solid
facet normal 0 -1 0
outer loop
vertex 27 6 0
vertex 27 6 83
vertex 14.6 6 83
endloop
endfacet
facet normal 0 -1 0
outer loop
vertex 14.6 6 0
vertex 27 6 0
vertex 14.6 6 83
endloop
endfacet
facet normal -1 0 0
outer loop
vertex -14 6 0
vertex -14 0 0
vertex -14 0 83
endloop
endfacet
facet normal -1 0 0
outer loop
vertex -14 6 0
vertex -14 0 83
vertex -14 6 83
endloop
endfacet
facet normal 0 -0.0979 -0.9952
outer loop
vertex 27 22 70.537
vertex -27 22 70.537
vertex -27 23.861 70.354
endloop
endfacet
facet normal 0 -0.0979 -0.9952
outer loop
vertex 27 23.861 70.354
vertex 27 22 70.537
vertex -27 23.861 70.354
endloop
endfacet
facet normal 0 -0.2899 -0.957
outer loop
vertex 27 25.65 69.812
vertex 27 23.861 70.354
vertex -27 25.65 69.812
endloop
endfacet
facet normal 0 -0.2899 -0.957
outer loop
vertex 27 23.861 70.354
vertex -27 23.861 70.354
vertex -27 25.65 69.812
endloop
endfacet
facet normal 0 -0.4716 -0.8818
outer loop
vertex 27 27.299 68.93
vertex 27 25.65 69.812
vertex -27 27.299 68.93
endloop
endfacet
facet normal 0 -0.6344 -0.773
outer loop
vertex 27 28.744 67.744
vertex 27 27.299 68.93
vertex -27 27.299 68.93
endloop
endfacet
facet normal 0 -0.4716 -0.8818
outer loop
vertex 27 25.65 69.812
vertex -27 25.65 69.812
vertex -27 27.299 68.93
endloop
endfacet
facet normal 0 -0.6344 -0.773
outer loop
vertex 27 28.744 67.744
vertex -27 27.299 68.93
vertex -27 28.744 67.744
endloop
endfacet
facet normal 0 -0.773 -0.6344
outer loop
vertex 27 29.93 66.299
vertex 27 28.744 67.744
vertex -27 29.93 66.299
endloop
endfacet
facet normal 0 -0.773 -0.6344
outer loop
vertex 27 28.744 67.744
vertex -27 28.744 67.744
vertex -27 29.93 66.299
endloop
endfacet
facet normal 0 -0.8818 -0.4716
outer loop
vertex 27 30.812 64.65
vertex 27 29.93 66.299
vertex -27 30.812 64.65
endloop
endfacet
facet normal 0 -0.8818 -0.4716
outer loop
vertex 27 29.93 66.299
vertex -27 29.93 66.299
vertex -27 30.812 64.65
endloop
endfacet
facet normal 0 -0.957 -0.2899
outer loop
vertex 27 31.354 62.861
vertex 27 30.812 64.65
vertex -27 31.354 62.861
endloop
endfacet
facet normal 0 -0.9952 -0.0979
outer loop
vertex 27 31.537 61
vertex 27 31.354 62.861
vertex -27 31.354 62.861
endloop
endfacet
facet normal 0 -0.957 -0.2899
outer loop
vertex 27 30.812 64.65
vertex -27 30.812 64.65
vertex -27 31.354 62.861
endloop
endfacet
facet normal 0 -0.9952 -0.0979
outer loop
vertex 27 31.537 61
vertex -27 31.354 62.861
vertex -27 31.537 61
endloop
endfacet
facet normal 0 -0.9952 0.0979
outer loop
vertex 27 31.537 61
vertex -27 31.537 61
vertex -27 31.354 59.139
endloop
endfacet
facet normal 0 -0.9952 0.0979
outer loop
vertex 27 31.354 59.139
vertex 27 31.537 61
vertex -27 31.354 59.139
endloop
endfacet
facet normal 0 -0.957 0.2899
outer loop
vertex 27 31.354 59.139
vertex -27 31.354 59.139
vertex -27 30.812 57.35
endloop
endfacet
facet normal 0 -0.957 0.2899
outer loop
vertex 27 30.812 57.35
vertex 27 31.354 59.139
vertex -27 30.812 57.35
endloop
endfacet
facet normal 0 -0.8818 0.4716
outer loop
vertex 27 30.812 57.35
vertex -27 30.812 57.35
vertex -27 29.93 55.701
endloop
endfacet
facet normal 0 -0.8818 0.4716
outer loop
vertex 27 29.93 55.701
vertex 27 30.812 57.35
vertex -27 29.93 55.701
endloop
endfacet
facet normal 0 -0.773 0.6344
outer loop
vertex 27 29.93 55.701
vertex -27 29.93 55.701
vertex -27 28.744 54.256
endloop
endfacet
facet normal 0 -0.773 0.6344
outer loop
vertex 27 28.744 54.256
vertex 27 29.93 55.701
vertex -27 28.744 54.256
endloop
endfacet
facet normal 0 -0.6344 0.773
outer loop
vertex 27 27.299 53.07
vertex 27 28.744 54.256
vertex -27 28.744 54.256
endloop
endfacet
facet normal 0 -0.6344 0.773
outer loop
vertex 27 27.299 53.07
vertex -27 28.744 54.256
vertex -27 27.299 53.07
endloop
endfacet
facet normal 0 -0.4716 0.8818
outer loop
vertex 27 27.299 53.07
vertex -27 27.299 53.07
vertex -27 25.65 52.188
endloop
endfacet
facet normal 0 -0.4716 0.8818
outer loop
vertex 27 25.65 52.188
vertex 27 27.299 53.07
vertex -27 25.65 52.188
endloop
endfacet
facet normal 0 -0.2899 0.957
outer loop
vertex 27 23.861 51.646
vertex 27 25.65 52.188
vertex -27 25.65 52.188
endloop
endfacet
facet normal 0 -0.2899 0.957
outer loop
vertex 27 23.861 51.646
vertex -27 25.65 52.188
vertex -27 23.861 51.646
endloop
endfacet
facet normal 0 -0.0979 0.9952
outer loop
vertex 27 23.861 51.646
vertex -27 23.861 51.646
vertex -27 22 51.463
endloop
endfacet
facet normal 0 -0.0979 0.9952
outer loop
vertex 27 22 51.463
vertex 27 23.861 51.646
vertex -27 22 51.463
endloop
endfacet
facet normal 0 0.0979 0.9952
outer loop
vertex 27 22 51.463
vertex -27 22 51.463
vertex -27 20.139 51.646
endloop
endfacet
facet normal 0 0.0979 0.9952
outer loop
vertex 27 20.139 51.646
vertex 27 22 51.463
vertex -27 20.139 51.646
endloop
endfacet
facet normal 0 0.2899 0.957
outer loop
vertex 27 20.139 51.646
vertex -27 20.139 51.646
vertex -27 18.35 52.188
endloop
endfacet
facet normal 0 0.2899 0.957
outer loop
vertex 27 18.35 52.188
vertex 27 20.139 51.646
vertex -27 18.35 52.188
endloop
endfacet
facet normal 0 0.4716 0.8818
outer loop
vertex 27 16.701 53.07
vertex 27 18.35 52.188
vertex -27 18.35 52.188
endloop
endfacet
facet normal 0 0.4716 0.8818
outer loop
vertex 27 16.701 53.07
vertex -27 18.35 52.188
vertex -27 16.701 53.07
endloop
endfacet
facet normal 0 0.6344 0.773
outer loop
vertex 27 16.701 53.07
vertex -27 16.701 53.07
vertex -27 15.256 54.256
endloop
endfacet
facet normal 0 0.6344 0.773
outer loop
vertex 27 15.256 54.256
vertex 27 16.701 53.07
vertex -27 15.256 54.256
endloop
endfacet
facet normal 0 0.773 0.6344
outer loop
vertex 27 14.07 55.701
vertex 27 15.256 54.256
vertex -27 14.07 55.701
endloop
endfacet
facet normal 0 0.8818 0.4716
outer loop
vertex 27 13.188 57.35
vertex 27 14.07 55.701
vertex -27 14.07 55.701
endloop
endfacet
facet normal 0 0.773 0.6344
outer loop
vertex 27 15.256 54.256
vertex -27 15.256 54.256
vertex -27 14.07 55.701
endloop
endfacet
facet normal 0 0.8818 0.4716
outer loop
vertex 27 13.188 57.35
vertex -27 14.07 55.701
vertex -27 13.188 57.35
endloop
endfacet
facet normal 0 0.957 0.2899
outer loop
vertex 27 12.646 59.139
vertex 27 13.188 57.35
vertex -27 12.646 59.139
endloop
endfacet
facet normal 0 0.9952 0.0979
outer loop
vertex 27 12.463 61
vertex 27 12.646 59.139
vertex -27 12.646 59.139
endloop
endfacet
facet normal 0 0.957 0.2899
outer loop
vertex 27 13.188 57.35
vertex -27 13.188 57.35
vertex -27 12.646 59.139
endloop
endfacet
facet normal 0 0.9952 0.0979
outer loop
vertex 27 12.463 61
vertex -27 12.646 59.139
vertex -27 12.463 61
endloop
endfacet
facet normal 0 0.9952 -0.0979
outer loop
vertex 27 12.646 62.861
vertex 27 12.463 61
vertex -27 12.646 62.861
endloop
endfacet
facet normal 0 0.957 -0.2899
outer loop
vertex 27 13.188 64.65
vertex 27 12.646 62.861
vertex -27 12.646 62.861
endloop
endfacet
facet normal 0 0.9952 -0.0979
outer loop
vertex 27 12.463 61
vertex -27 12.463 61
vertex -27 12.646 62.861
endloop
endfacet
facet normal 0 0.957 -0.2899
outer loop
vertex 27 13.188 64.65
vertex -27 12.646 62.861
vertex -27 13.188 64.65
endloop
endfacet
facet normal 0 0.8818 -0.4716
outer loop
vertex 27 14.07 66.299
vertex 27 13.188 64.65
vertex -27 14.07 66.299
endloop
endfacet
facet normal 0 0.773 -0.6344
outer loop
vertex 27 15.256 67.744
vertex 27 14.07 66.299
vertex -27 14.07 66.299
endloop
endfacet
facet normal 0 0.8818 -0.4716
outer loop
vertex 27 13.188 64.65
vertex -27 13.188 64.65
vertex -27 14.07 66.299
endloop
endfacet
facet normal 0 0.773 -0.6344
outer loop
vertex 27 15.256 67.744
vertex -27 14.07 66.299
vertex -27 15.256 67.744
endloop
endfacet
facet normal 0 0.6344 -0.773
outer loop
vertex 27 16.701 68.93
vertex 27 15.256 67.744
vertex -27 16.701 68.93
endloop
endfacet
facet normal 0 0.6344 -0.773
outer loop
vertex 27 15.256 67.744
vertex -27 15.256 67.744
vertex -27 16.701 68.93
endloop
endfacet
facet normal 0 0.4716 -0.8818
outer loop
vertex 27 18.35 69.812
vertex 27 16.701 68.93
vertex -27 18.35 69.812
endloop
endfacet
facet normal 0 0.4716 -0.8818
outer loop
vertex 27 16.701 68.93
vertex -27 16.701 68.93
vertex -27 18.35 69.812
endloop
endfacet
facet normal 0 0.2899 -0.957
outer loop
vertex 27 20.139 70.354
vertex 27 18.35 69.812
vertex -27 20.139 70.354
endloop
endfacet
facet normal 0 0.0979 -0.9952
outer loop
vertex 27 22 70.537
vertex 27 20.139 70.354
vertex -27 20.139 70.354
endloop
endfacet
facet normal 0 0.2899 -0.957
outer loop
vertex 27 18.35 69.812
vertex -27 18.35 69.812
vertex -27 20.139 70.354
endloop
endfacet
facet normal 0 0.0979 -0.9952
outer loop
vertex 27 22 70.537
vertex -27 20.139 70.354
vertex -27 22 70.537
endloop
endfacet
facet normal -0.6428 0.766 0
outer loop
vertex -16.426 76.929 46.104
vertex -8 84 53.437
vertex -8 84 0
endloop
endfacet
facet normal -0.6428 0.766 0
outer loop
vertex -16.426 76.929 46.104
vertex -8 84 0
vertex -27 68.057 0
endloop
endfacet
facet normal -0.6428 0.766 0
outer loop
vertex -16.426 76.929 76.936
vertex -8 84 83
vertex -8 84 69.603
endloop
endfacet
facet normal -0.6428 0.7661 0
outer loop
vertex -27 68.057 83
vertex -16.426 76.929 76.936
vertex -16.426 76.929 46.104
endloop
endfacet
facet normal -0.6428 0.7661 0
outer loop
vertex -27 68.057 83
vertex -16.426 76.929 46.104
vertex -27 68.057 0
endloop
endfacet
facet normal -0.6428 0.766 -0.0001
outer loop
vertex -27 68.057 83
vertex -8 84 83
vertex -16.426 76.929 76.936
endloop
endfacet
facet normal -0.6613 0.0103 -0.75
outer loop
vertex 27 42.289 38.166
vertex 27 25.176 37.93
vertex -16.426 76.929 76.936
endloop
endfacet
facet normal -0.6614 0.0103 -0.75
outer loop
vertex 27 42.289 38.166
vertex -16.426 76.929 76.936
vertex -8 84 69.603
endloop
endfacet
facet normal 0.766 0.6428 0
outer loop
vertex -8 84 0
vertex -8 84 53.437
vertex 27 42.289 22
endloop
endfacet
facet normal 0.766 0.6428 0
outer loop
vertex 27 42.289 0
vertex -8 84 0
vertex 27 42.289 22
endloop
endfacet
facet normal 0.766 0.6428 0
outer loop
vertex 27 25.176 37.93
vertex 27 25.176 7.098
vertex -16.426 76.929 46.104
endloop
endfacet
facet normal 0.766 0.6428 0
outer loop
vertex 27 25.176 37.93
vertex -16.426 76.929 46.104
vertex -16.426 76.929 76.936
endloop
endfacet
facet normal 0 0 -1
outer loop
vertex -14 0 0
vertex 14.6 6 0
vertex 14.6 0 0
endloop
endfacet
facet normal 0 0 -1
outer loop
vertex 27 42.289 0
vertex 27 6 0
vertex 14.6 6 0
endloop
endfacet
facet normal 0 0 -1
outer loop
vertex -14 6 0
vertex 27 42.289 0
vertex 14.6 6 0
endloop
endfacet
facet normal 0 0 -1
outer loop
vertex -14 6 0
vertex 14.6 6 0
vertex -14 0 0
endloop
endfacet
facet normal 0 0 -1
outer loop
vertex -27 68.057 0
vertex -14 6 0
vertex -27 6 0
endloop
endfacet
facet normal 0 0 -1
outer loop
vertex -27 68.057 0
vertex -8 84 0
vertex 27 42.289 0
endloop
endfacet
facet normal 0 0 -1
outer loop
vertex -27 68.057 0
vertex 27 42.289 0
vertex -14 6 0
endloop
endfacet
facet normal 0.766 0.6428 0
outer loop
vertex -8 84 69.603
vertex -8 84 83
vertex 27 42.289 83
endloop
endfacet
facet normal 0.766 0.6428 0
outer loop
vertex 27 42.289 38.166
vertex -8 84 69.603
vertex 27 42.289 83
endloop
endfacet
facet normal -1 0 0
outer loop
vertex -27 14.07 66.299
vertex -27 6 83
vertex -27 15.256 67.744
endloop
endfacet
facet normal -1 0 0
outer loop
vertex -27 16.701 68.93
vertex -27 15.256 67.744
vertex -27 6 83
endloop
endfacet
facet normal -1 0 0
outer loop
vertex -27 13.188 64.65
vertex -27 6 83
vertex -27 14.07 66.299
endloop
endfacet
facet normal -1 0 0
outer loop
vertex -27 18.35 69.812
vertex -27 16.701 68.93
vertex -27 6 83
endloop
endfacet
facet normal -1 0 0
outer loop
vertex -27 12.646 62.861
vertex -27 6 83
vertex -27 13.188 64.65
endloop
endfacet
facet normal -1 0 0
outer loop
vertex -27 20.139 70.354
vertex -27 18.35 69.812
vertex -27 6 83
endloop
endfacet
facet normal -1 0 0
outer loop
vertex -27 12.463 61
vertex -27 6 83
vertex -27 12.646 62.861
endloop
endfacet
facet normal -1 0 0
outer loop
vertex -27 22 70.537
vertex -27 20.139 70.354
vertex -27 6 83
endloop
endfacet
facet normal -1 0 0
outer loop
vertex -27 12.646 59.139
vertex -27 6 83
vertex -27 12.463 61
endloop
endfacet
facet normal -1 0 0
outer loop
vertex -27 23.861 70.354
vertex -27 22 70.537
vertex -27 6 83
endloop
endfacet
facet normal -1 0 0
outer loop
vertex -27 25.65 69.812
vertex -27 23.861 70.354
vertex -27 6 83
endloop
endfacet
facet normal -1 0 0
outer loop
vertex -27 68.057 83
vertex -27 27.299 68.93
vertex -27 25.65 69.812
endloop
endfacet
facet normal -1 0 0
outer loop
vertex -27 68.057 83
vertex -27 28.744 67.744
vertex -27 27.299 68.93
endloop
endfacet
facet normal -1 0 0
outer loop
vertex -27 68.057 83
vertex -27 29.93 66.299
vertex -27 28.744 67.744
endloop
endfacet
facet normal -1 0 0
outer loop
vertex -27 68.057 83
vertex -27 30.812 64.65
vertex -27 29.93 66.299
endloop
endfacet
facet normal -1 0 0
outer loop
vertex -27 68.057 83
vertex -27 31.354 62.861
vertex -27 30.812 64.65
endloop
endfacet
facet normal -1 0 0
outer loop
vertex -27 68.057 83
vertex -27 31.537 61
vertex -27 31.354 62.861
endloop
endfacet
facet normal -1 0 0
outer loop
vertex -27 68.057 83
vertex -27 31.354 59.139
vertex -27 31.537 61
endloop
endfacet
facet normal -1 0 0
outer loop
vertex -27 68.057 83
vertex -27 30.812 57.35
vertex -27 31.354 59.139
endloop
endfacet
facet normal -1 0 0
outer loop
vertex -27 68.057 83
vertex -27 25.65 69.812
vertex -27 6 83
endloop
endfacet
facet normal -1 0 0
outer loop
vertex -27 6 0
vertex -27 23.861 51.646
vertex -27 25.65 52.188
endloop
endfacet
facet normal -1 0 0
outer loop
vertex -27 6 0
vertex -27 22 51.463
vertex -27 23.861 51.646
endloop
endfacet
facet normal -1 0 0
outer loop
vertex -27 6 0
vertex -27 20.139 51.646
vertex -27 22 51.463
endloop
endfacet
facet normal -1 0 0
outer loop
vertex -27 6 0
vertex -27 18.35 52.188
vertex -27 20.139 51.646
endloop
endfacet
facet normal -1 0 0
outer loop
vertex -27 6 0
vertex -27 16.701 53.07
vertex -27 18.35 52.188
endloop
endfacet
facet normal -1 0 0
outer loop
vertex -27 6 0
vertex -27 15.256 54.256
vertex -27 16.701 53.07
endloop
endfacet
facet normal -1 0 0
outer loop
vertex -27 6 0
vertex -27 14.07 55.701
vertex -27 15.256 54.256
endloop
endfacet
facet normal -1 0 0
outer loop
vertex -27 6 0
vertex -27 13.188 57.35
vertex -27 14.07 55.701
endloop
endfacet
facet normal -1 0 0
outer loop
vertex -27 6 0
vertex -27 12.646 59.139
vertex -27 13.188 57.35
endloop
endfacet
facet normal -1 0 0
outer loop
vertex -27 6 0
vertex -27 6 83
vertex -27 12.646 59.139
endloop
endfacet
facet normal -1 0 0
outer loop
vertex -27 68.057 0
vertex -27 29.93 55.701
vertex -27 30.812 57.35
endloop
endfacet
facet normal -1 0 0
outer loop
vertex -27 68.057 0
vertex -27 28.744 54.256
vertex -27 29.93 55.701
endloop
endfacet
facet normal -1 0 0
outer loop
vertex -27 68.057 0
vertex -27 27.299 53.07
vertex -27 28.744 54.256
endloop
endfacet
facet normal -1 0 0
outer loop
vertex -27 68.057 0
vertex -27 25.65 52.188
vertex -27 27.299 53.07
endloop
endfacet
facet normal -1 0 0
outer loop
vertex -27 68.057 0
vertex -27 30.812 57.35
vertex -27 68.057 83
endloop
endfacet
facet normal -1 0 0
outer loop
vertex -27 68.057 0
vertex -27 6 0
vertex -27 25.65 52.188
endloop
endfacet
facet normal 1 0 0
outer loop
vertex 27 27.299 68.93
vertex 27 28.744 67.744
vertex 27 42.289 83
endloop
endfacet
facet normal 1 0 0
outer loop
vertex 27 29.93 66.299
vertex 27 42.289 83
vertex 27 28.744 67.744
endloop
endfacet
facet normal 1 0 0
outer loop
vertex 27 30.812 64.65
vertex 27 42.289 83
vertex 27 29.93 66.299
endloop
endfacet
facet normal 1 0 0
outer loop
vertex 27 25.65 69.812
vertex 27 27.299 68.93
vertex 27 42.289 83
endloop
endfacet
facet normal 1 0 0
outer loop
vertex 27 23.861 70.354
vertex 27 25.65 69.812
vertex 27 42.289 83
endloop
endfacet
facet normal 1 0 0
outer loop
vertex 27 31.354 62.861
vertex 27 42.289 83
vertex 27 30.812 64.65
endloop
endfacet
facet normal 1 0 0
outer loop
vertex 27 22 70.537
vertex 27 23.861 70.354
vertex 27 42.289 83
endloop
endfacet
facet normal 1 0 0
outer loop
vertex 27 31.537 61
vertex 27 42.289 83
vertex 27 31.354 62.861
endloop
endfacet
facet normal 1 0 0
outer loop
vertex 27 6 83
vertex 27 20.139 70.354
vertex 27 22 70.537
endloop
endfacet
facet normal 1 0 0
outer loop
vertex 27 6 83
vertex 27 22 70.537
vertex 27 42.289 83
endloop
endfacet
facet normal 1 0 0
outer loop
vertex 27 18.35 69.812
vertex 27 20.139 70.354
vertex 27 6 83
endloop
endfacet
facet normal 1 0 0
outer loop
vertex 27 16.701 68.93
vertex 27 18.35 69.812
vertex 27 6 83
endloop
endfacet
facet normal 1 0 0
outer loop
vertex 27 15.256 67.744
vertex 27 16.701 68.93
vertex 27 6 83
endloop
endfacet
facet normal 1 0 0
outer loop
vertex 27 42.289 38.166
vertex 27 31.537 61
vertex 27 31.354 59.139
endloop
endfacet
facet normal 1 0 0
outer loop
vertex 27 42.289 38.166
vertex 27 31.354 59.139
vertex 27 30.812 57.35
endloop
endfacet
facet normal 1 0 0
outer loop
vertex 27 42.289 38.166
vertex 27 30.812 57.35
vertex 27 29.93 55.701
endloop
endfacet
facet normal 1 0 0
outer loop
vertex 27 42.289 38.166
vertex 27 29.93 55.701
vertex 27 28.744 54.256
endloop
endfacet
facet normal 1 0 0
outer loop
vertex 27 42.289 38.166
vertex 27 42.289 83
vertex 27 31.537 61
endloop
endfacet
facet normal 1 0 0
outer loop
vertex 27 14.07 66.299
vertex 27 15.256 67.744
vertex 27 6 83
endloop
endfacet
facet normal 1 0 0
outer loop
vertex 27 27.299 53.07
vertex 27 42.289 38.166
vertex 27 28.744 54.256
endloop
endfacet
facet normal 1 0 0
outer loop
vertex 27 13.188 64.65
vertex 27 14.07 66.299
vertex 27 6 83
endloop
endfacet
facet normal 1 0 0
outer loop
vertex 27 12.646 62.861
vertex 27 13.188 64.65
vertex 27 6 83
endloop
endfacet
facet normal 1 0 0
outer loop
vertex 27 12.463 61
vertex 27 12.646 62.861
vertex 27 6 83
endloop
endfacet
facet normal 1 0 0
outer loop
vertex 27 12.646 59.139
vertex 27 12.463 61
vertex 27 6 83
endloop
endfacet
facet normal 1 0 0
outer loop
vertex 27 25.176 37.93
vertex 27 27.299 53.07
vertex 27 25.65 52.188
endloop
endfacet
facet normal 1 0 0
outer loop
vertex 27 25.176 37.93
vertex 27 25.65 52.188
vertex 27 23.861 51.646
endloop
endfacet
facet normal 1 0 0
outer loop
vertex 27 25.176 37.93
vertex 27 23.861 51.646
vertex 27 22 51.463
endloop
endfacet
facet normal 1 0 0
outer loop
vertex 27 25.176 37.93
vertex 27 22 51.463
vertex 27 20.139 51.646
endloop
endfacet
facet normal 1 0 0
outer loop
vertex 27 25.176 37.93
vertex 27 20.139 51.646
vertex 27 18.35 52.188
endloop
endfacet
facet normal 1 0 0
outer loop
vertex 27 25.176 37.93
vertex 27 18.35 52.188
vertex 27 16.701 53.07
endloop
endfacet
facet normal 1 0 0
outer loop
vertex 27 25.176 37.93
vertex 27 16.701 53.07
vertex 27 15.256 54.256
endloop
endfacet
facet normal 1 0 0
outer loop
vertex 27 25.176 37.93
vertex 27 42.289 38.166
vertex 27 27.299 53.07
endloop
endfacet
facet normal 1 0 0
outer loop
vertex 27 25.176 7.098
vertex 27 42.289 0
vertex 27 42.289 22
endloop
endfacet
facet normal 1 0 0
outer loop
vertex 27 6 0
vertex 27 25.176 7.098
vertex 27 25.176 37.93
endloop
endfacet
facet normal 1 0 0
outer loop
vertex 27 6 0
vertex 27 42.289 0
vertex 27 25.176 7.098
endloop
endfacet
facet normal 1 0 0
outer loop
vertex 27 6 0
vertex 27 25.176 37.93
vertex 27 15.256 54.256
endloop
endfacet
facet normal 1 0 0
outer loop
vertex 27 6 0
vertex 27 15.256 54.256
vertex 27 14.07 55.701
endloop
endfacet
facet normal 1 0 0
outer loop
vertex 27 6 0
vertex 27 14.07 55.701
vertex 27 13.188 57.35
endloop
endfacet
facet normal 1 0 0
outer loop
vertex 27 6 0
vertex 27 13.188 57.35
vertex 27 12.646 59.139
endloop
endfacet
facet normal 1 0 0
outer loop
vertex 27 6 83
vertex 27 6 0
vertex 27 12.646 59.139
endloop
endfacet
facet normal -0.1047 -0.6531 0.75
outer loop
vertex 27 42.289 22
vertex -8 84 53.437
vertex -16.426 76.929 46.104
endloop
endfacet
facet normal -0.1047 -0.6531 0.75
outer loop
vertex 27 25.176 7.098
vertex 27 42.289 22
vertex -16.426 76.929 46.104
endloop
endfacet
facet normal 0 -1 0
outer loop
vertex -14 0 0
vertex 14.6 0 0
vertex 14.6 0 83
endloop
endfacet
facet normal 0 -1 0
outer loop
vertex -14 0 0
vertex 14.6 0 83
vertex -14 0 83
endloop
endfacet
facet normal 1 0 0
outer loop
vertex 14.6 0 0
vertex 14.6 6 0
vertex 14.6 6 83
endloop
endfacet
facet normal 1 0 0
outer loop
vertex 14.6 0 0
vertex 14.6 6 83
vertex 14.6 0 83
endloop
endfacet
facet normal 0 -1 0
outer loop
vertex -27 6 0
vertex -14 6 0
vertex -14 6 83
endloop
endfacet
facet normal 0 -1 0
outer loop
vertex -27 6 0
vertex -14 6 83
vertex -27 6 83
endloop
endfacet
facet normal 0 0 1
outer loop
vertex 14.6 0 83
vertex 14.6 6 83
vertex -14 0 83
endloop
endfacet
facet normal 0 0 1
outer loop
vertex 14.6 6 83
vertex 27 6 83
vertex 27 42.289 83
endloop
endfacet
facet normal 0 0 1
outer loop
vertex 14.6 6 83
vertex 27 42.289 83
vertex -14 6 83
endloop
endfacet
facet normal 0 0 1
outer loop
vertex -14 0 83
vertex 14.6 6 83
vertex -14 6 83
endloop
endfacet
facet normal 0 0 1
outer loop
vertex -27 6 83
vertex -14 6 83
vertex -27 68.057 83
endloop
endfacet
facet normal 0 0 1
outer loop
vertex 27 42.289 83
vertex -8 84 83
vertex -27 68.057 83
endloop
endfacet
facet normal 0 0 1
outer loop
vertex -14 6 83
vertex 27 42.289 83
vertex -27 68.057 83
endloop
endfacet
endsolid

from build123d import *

# Parameters (mm, degrees)
FRONT_PLANE_EXTRUDED_BOSS_DEPTH       = 83
SMALLER_TRIANGULAR_EXTRUDED_CUT_DEPTH = 122.136286884
BIGGER_TRIANGULAR_EXTRUDED_CUT_DEPTH  = 122.136286884
F_19_075D_HOLE_D                      = 19.07499995
DOVETAIL_EXTRUDED_CUT_DEPTH           = 106.52963508
DOVETAIL_EXTRUDED_CUT_DEPTH_BACK      = 106.52963508


with BuildPart() as part:
    # Sketch4 → Front Plane Extruded Boss (new body)
    with BuildSketch(Plane.XY):
        Polygon((14.6, 0), (-14, 0), (-14, 6), (-27, 6), (-27, 84), (27, 84), (27, 6), (14.6, 6), align=None)
    extrude(amount=FRONT_PLANE_EXTRUDED_BOSS_DEPTH)

    # Sketch5 → Smaller Triangular Extruded Cut (cut, through all)
    with BuildSketch(Plane.XY.offset(83)):
        Polygon((-27, 84), (-8, 84), (-27, 68.057107008), align=None)
    extrude(amount=-SMALLER_TRIANGULAR_EXTRUDED_CUT_DEPTH, mode=Mode.SUBTRACT)

    # Sketch6 → Bigger Triangular Extruded Cut (cut, through all)
    with BuildSketch(Plane.XY.offset(83)):
        Polygon((27, 84), (-8, 84), (27, 42.288624259), align=None)
    extrude(amount=-BIGGER_TRIANGULAR_EXTRUDED_CUT_DEPTH, mode=Mode.SUBTRACT)

    # 19.075D Hole (through all)
    with Locations(Plane(origin=(27, 0, 0), x_dir=(0, 0, -1), z_dir=(1, 0, 0))):
        with Locations((-61, 22)):
            Hole(F_19_075D_HOLE_D / 2)

    # Sketch13 → Dovetail Extruded Cut (cut, two sides: drawn at the far end of the back side and taken through both)
    with BuildSketch(Plane(origin=(-8, 84, 53.436914958), x_dir=(0.8307334510088613, 0.4445504234012626, 0.3350475405500927), z_dir=(-0.5566703992264255, 0.6634139481689373, 0.49999999999999484)).offset(-DOVETAIL_EXTRUDED_CUT_DEPTH_BACK)):
        Polygon((0, 0), (-12.600448024, 1.600638285), (-2.270103373, -23.021812416), (5.416314056, -12.909823471), align=None)
    extrude(amount=DOVETAIL_EXTRUDED_CUT_DEPTH + DOVETAIL_EXTRUDED_CUT_DEPTH_BACK, mode=Mode.SUBTRACT)


solid = part.part
